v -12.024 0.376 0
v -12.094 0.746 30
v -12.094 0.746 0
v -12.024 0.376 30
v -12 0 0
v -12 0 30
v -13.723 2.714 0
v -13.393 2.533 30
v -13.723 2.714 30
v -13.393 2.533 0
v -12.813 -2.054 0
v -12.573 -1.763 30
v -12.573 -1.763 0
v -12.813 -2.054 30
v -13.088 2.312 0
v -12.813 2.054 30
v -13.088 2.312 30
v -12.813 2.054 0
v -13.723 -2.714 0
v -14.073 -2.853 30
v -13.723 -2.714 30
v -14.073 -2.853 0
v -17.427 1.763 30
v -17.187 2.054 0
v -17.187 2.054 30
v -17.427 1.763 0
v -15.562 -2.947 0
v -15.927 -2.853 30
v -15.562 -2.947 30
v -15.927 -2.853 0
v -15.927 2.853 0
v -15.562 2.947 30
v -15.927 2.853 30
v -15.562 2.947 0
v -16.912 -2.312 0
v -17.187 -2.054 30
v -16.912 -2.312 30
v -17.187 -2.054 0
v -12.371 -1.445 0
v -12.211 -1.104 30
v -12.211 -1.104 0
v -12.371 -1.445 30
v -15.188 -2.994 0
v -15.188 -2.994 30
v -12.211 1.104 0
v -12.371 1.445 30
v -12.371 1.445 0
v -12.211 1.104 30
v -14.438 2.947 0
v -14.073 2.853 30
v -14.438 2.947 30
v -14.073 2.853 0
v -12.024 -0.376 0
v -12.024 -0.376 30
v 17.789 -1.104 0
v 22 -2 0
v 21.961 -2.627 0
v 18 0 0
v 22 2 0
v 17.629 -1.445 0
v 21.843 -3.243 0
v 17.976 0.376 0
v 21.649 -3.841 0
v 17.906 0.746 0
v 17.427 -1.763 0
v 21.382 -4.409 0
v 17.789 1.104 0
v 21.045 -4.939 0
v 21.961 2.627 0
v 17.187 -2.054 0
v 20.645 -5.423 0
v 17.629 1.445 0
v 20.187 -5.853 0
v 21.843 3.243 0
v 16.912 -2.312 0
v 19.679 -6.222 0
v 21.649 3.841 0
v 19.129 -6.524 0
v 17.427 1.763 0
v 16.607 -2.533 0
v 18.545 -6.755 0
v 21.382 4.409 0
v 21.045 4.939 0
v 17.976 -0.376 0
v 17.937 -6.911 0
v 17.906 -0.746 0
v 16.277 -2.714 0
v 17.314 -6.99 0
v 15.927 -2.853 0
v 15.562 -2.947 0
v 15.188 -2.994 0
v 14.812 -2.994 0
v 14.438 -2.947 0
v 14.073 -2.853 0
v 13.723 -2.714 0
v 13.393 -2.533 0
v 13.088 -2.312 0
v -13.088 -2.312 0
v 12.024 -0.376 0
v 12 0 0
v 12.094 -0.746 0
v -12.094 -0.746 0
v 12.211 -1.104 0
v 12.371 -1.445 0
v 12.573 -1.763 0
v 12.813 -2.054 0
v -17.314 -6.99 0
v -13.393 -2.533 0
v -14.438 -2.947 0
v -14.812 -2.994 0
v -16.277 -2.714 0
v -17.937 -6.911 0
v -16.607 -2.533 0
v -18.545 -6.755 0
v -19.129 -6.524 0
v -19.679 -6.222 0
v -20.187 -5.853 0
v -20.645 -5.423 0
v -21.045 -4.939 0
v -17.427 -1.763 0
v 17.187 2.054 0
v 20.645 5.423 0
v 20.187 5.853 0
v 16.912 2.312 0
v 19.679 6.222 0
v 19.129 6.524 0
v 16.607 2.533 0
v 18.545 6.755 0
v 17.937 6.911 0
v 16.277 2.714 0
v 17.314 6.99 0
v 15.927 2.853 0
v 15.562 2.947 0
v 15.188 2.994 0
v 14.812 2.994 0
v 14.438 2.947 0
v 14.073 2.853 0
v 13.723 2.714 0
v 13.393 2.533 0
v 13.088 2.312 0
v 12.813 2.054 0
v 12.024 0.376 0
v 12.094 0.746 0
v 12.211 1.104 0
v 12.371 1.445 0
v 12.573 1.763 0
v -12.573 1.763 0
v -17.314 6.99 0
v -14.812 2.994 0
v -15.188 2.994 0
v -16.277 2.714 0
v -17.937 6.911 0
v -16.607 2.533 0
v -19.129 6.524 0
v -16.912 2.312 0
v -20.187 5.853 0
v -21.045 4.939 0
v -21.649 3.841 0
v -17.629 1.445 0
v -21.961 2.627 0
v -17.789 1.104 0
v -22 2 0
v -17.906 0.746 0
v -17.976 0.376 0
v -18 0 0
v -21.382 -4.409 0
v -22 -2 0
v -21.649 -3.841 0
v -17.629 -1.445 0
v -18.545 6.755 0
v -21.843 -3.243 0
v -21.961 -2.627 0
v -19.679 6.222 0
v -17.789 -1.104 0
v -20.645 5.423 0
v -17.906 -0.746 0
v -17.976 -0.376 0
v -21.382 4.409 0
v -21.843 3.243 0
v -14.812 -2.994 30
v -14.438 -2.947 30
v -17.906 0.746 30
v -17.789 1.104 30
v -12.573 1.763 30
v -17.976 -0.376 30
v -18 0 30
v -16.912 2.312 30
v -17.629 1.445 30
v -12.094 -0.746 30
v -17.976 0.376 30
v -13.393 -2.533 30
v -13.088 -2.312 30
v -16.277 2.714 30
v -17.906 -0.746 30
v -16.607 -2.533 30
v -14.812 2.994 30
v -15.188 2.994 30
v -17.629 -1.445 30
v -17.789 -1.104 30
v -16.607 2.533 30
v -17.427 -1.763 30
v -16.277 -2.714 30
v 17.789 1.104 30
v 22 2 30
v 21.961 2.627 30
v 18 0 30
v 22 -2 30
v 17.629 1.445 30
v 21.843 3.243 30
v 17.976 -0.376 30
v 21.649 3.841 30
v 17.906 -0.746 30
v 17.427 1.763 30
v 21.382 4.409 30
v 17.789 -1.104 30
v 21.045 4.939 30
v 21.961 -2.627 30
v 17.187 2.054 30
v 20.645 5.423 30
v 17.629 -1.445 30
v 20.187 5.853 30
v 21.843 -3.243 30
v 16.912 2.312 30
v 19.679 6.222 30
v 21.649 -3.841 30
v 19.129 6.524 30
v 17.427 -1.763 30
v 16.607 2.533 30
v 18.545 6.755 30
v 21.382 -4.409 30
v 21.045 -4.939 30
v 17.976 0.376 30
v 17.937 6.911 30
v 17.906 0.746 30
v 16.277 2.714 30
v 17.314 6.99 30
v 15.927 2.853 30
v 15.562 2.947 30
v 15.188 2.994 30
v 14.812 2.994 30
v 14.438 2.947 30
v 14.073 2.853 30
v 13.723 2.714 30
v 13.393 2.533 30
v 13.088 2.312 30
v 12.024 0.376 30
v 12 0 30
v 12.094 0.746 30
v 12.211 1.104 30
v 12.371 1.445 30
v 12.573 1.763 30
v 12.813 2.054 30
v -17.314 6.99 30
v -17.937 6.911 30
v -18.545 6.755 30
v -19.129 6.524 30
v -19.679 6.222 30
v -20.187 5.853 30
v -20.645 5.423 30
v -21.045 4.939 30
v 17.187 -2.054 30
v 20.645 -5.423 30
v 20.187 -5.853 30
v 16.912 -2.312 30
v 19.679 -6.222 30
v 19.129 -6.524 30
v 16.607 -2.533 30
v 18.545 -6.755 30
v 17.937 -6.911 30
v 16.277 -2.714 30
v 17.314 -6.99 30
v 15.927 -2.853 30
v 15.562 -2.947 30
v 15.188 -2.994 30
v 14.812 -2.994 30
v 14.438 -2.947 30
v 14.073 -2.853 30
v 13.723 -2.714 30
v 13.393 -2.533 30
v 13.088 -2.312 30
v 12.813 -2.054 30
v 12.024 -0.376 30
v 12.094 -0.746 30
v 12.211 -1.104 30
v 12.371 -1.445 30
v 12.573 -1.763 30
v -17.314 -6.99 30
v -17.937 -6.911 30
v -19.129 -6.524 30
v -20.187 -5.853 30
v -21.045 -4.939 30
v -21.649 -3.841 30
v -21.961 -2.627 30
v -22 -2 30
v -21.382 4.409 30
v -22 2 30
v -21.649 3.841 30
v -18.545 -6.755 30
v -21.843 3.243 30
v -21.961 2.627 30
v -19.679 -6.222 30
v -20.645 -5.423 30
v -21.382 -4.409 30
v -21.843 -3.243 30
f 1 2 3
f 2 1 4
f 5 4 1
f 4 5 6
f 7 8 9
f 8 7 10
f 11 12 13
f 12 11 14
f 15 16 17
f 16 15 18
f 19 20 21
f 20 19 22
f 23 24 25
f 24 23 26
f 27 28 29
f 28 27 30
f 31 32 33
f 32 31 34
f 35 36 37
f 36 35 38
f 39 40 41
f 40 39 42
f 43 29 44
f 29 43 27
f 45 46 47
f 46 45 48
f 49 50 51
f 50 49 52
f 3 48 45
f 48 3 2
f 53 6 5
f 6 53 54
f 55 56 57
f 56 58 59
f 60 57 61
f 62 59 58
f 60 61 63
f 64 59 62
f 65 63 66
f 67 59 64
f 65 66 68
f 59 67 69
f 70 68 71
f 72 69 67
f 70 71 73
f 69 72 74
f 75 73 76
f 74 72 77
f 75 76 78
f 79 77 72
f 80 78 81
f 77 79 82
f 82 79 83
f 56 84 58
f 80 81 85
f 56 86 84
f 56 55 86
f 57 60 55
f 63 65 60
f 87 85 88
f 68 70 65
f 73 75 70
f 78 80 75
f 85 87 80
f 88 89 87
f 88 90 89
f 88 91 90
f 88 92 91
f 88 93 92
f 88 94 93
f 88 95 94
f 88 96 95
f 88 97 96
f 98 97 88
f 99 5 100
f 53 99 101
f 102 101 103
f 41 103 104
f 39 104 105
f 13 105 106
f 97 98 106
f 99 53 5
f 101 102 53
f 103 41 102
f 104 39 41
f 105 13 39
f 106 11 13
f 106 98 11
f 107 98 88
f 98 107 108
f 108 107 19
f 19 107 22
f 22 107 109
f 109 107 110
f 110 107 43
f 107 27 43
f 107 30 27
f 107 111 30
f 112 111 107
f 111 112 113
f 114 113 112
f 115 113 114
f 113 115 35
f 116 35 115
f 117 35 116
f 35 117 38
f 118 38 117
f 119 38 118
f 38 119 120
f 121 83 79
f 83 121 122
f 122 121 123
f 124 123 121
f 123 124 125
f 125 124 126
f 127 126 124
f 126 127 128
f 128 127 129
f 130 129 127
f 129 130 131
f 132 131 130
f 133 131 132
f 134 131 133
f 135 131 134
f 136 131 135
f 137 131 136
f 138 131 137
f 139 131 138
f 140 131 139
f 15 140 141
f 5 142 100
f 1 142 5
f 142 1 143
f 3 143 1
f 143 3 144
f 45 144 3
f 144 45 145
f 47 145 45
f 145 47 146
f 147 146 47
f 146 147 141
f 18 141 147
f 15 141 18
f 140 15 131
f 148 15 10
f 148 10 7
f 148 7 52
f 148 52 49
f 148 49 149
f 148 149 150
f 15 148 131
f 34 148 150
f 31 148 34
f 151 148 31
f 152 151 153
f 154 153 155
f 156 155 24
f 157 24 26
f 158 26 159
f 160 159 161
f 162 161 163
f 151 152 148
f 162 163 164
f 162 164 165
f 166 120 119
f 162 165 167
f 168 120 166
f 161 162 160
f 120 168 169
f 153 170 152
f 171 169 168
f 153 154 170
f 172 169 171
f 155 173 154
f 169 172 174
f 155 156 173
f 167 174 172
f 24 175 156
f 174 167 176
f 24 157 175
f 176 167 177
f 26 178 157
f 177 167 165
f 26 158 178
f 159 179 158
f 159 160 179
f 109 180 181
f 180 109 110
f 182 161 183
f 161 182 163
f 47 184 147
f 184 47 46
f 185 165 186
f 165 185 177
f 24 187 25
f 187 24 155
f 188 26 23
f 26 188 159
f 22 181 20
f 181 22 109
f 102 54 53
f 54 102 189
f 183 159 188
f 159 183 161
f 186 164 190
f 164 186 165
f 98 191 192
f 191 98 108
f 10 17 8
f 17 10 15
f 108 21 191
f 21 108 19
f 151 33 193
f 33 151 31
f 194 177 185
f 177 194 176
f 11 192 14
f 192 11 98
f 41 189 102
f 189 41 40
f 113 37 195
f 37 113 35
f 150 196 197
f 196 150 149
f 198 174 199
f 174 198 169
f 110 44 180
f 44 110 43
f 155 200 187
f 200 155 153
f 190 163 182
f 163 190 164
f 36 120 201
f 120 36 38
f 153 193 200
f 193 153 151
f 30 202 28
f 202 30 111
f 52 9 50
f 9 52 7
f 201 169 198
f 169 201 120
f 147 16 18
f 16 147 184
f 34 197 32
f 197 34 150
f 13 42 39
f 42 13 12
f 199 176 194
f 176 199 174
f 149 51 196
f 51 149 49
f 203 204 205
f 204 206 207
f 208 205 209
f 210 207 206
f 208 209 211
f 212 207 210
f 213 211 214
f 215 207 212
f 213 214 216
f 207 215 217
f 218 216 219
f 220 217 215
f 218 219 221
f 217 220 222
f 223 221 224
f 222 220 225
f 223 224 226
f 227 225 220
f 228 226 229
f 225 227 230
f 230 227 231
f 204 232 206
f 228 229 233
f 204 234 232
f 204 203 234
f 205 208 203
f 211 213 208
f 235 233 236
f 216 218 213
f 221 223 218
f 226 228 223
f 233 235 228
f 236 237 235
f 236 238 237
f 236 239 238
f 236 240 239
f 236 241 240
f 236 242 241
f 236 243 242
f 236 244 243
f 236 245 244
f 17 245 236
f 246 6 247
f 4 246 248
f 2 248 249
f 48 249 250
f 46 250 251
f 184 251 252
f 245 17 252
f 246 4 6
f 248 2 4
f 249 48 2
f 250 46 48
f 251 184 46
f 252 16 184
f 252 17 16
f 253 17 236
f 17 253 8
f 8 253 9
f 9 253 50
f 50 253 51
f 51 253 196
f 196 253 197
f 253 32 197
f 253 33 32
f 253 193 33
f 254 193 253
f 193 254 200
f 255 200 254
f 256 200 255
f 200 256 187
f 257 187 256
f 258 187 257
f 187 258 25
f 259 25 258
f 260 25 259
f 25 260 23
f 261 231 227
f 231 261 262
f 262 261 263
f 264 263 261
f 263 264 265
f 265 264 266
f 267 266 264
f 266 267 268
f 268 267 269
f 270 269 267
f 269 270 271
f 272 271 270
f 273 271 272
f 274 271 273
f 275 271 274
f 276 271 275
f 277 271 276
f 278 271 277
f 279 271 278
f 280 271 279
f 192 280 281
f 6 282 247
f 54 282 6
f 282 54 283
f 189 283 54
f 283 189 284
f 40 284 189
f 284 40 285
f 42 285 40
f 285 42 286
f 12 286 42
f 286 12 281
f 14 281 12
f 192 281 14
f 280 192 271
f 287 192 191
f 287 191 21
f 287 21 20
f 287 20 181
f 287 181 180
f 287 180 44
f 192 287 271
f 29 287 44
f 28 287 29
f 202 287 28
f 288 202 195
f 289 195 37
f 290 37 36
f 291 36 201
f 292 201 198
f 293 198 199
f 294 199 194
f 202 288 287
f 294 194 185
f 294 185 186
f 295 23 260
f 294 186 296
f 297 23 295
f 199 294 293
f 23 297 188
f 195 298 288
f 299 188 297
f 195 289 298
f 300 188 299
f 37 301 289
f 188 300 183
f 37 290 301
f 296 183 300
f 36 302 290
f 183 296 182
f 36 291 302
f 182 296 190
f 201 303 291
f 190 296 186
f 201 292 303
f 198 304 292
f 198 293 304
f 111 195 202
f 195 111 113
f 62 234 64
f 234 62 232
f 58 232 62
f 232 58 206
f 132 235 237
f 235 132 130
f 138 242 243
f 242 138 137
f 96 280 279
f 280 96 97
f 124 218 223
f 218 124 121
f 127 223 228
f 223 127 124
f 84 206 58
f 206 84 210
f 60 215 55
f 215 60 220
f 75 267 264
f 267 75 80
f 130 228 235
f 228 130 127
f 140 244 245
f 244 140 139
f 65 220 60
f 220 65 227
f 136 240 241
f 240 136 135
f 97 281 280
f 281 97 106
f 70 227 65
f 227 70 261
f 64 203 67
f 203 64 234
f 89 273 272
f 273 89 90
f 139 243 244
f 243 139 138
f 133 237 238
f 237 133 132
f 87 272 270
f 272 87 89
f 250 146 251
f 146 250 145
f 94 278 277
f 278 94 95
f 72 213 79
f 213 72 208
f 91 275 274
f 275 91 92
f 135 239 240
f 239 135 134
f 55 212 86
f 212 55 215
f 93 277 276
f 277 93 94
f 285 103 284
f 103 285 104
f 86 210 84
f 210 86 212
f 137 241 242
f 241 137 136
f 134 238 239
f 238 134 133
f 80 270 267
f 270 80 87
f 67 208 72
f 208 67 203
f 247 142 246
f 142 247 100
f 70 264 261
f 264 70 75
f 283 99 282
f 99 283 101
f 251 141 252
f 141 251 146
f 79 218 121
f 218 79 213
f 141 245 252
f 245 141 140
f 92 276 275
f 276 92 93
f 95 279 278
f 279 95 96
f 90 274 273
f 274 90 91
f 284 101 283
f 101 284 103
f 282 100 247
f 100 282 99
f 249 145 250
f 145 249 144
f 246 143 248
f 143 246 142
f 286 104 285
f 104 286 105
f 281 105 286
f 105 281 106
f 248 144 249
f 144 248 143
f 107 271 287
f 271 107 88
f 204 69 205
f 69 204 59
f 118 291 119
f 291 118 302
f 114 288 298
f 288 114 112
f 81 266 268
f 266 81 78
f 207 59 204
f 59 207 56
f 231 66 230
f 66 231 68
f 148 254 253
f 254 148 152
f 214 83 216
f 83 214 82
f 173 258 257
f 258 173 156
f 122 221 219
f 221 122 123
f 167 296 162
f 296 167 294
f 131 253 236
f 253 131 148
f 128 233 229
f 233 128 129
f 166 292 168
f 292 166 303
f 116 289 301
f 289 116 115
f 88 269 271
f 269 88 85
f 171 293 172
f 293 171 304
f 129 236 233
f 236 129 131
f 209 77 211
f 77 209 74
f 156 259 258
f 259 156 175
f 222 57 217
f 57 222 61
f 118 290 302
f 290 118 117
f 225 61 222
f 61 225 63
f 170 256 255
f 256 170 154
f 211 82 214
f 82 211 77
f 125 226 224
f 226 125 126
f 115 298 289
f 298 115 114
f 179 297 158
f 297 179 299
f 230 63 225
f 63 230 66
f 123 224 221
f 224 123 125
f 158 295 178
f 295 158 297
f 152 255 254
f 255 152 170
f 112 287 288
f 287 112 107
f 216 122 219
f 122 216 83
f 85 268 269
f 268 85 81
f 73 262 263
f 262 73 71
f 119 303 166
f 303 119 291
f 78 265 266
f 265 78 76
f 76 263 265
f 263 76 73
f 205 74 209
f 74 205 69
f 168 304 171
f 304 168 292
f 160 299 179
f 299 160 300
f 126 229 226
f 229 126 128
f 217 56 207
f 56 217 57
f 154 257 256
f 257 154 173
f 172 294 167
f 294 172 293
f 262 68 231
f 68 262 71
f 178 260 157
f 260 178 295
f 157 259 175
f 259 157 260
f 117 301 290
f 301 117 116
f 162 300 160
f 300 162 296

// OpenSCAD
$fn = 50;


difference() {
	union() {
		hull() {
			translate(v = [-17.0000000000, 2.0000000000, 0]) {
				cylinder(h = 30, r = 5);
			}
			translate(v = [17.0000000000, 2.0000000000, 0]) {
				cylinder(h = 30, r = 5);
			}
			translate(v = [-17.0000000000, -2.0000000000, 0]) {
				cylinder(h = 30, r = 5);
			}
			translate(v = [17.0000000000, -2.0000000000, 0]) {
				cylinder(h = 30, r = 5);
			}
		}
	}
	union() {
		translate(v = [-15.0000000000, 0.0000000000, 0]) {
			cylinder(h = 30, r = 3.0000000000);
		}
		translate(v = [15.0000000000, 0.0000000000, 0]) {
			cylinder(h = 30, r = 3.0000000000);
		}
		translate(v = [-15.0000000000, 0.0000000000, 0]) {
			cylinder(h = 30, r = 1.5000000000);
		}
		translate(v = [15.0000000000, 0.0000000000, 0]) {
			cylinder(h = 30, r = 1.5000000000);
		}
		translate(v = [-15.0000000000, 0.0000000000, 0]) {
			cylinder(h = 30, r = 1.5000000000);
		}
		translate(v = [15.0000000000, 0.0000000000, 0]) {
			cylinder(h = 30, r = 1.5000000000);
		}
		translate(v = [-15.0000000000, 0.0000000000, 0]) {
			cylinder(h = 30, r = 1.5000000000);
		}
		translate(v = [15.0000000000, 0.0000000000, 0]) {
			cylinder(h = 30, r = 1.5000000000);
		}
	}
}
